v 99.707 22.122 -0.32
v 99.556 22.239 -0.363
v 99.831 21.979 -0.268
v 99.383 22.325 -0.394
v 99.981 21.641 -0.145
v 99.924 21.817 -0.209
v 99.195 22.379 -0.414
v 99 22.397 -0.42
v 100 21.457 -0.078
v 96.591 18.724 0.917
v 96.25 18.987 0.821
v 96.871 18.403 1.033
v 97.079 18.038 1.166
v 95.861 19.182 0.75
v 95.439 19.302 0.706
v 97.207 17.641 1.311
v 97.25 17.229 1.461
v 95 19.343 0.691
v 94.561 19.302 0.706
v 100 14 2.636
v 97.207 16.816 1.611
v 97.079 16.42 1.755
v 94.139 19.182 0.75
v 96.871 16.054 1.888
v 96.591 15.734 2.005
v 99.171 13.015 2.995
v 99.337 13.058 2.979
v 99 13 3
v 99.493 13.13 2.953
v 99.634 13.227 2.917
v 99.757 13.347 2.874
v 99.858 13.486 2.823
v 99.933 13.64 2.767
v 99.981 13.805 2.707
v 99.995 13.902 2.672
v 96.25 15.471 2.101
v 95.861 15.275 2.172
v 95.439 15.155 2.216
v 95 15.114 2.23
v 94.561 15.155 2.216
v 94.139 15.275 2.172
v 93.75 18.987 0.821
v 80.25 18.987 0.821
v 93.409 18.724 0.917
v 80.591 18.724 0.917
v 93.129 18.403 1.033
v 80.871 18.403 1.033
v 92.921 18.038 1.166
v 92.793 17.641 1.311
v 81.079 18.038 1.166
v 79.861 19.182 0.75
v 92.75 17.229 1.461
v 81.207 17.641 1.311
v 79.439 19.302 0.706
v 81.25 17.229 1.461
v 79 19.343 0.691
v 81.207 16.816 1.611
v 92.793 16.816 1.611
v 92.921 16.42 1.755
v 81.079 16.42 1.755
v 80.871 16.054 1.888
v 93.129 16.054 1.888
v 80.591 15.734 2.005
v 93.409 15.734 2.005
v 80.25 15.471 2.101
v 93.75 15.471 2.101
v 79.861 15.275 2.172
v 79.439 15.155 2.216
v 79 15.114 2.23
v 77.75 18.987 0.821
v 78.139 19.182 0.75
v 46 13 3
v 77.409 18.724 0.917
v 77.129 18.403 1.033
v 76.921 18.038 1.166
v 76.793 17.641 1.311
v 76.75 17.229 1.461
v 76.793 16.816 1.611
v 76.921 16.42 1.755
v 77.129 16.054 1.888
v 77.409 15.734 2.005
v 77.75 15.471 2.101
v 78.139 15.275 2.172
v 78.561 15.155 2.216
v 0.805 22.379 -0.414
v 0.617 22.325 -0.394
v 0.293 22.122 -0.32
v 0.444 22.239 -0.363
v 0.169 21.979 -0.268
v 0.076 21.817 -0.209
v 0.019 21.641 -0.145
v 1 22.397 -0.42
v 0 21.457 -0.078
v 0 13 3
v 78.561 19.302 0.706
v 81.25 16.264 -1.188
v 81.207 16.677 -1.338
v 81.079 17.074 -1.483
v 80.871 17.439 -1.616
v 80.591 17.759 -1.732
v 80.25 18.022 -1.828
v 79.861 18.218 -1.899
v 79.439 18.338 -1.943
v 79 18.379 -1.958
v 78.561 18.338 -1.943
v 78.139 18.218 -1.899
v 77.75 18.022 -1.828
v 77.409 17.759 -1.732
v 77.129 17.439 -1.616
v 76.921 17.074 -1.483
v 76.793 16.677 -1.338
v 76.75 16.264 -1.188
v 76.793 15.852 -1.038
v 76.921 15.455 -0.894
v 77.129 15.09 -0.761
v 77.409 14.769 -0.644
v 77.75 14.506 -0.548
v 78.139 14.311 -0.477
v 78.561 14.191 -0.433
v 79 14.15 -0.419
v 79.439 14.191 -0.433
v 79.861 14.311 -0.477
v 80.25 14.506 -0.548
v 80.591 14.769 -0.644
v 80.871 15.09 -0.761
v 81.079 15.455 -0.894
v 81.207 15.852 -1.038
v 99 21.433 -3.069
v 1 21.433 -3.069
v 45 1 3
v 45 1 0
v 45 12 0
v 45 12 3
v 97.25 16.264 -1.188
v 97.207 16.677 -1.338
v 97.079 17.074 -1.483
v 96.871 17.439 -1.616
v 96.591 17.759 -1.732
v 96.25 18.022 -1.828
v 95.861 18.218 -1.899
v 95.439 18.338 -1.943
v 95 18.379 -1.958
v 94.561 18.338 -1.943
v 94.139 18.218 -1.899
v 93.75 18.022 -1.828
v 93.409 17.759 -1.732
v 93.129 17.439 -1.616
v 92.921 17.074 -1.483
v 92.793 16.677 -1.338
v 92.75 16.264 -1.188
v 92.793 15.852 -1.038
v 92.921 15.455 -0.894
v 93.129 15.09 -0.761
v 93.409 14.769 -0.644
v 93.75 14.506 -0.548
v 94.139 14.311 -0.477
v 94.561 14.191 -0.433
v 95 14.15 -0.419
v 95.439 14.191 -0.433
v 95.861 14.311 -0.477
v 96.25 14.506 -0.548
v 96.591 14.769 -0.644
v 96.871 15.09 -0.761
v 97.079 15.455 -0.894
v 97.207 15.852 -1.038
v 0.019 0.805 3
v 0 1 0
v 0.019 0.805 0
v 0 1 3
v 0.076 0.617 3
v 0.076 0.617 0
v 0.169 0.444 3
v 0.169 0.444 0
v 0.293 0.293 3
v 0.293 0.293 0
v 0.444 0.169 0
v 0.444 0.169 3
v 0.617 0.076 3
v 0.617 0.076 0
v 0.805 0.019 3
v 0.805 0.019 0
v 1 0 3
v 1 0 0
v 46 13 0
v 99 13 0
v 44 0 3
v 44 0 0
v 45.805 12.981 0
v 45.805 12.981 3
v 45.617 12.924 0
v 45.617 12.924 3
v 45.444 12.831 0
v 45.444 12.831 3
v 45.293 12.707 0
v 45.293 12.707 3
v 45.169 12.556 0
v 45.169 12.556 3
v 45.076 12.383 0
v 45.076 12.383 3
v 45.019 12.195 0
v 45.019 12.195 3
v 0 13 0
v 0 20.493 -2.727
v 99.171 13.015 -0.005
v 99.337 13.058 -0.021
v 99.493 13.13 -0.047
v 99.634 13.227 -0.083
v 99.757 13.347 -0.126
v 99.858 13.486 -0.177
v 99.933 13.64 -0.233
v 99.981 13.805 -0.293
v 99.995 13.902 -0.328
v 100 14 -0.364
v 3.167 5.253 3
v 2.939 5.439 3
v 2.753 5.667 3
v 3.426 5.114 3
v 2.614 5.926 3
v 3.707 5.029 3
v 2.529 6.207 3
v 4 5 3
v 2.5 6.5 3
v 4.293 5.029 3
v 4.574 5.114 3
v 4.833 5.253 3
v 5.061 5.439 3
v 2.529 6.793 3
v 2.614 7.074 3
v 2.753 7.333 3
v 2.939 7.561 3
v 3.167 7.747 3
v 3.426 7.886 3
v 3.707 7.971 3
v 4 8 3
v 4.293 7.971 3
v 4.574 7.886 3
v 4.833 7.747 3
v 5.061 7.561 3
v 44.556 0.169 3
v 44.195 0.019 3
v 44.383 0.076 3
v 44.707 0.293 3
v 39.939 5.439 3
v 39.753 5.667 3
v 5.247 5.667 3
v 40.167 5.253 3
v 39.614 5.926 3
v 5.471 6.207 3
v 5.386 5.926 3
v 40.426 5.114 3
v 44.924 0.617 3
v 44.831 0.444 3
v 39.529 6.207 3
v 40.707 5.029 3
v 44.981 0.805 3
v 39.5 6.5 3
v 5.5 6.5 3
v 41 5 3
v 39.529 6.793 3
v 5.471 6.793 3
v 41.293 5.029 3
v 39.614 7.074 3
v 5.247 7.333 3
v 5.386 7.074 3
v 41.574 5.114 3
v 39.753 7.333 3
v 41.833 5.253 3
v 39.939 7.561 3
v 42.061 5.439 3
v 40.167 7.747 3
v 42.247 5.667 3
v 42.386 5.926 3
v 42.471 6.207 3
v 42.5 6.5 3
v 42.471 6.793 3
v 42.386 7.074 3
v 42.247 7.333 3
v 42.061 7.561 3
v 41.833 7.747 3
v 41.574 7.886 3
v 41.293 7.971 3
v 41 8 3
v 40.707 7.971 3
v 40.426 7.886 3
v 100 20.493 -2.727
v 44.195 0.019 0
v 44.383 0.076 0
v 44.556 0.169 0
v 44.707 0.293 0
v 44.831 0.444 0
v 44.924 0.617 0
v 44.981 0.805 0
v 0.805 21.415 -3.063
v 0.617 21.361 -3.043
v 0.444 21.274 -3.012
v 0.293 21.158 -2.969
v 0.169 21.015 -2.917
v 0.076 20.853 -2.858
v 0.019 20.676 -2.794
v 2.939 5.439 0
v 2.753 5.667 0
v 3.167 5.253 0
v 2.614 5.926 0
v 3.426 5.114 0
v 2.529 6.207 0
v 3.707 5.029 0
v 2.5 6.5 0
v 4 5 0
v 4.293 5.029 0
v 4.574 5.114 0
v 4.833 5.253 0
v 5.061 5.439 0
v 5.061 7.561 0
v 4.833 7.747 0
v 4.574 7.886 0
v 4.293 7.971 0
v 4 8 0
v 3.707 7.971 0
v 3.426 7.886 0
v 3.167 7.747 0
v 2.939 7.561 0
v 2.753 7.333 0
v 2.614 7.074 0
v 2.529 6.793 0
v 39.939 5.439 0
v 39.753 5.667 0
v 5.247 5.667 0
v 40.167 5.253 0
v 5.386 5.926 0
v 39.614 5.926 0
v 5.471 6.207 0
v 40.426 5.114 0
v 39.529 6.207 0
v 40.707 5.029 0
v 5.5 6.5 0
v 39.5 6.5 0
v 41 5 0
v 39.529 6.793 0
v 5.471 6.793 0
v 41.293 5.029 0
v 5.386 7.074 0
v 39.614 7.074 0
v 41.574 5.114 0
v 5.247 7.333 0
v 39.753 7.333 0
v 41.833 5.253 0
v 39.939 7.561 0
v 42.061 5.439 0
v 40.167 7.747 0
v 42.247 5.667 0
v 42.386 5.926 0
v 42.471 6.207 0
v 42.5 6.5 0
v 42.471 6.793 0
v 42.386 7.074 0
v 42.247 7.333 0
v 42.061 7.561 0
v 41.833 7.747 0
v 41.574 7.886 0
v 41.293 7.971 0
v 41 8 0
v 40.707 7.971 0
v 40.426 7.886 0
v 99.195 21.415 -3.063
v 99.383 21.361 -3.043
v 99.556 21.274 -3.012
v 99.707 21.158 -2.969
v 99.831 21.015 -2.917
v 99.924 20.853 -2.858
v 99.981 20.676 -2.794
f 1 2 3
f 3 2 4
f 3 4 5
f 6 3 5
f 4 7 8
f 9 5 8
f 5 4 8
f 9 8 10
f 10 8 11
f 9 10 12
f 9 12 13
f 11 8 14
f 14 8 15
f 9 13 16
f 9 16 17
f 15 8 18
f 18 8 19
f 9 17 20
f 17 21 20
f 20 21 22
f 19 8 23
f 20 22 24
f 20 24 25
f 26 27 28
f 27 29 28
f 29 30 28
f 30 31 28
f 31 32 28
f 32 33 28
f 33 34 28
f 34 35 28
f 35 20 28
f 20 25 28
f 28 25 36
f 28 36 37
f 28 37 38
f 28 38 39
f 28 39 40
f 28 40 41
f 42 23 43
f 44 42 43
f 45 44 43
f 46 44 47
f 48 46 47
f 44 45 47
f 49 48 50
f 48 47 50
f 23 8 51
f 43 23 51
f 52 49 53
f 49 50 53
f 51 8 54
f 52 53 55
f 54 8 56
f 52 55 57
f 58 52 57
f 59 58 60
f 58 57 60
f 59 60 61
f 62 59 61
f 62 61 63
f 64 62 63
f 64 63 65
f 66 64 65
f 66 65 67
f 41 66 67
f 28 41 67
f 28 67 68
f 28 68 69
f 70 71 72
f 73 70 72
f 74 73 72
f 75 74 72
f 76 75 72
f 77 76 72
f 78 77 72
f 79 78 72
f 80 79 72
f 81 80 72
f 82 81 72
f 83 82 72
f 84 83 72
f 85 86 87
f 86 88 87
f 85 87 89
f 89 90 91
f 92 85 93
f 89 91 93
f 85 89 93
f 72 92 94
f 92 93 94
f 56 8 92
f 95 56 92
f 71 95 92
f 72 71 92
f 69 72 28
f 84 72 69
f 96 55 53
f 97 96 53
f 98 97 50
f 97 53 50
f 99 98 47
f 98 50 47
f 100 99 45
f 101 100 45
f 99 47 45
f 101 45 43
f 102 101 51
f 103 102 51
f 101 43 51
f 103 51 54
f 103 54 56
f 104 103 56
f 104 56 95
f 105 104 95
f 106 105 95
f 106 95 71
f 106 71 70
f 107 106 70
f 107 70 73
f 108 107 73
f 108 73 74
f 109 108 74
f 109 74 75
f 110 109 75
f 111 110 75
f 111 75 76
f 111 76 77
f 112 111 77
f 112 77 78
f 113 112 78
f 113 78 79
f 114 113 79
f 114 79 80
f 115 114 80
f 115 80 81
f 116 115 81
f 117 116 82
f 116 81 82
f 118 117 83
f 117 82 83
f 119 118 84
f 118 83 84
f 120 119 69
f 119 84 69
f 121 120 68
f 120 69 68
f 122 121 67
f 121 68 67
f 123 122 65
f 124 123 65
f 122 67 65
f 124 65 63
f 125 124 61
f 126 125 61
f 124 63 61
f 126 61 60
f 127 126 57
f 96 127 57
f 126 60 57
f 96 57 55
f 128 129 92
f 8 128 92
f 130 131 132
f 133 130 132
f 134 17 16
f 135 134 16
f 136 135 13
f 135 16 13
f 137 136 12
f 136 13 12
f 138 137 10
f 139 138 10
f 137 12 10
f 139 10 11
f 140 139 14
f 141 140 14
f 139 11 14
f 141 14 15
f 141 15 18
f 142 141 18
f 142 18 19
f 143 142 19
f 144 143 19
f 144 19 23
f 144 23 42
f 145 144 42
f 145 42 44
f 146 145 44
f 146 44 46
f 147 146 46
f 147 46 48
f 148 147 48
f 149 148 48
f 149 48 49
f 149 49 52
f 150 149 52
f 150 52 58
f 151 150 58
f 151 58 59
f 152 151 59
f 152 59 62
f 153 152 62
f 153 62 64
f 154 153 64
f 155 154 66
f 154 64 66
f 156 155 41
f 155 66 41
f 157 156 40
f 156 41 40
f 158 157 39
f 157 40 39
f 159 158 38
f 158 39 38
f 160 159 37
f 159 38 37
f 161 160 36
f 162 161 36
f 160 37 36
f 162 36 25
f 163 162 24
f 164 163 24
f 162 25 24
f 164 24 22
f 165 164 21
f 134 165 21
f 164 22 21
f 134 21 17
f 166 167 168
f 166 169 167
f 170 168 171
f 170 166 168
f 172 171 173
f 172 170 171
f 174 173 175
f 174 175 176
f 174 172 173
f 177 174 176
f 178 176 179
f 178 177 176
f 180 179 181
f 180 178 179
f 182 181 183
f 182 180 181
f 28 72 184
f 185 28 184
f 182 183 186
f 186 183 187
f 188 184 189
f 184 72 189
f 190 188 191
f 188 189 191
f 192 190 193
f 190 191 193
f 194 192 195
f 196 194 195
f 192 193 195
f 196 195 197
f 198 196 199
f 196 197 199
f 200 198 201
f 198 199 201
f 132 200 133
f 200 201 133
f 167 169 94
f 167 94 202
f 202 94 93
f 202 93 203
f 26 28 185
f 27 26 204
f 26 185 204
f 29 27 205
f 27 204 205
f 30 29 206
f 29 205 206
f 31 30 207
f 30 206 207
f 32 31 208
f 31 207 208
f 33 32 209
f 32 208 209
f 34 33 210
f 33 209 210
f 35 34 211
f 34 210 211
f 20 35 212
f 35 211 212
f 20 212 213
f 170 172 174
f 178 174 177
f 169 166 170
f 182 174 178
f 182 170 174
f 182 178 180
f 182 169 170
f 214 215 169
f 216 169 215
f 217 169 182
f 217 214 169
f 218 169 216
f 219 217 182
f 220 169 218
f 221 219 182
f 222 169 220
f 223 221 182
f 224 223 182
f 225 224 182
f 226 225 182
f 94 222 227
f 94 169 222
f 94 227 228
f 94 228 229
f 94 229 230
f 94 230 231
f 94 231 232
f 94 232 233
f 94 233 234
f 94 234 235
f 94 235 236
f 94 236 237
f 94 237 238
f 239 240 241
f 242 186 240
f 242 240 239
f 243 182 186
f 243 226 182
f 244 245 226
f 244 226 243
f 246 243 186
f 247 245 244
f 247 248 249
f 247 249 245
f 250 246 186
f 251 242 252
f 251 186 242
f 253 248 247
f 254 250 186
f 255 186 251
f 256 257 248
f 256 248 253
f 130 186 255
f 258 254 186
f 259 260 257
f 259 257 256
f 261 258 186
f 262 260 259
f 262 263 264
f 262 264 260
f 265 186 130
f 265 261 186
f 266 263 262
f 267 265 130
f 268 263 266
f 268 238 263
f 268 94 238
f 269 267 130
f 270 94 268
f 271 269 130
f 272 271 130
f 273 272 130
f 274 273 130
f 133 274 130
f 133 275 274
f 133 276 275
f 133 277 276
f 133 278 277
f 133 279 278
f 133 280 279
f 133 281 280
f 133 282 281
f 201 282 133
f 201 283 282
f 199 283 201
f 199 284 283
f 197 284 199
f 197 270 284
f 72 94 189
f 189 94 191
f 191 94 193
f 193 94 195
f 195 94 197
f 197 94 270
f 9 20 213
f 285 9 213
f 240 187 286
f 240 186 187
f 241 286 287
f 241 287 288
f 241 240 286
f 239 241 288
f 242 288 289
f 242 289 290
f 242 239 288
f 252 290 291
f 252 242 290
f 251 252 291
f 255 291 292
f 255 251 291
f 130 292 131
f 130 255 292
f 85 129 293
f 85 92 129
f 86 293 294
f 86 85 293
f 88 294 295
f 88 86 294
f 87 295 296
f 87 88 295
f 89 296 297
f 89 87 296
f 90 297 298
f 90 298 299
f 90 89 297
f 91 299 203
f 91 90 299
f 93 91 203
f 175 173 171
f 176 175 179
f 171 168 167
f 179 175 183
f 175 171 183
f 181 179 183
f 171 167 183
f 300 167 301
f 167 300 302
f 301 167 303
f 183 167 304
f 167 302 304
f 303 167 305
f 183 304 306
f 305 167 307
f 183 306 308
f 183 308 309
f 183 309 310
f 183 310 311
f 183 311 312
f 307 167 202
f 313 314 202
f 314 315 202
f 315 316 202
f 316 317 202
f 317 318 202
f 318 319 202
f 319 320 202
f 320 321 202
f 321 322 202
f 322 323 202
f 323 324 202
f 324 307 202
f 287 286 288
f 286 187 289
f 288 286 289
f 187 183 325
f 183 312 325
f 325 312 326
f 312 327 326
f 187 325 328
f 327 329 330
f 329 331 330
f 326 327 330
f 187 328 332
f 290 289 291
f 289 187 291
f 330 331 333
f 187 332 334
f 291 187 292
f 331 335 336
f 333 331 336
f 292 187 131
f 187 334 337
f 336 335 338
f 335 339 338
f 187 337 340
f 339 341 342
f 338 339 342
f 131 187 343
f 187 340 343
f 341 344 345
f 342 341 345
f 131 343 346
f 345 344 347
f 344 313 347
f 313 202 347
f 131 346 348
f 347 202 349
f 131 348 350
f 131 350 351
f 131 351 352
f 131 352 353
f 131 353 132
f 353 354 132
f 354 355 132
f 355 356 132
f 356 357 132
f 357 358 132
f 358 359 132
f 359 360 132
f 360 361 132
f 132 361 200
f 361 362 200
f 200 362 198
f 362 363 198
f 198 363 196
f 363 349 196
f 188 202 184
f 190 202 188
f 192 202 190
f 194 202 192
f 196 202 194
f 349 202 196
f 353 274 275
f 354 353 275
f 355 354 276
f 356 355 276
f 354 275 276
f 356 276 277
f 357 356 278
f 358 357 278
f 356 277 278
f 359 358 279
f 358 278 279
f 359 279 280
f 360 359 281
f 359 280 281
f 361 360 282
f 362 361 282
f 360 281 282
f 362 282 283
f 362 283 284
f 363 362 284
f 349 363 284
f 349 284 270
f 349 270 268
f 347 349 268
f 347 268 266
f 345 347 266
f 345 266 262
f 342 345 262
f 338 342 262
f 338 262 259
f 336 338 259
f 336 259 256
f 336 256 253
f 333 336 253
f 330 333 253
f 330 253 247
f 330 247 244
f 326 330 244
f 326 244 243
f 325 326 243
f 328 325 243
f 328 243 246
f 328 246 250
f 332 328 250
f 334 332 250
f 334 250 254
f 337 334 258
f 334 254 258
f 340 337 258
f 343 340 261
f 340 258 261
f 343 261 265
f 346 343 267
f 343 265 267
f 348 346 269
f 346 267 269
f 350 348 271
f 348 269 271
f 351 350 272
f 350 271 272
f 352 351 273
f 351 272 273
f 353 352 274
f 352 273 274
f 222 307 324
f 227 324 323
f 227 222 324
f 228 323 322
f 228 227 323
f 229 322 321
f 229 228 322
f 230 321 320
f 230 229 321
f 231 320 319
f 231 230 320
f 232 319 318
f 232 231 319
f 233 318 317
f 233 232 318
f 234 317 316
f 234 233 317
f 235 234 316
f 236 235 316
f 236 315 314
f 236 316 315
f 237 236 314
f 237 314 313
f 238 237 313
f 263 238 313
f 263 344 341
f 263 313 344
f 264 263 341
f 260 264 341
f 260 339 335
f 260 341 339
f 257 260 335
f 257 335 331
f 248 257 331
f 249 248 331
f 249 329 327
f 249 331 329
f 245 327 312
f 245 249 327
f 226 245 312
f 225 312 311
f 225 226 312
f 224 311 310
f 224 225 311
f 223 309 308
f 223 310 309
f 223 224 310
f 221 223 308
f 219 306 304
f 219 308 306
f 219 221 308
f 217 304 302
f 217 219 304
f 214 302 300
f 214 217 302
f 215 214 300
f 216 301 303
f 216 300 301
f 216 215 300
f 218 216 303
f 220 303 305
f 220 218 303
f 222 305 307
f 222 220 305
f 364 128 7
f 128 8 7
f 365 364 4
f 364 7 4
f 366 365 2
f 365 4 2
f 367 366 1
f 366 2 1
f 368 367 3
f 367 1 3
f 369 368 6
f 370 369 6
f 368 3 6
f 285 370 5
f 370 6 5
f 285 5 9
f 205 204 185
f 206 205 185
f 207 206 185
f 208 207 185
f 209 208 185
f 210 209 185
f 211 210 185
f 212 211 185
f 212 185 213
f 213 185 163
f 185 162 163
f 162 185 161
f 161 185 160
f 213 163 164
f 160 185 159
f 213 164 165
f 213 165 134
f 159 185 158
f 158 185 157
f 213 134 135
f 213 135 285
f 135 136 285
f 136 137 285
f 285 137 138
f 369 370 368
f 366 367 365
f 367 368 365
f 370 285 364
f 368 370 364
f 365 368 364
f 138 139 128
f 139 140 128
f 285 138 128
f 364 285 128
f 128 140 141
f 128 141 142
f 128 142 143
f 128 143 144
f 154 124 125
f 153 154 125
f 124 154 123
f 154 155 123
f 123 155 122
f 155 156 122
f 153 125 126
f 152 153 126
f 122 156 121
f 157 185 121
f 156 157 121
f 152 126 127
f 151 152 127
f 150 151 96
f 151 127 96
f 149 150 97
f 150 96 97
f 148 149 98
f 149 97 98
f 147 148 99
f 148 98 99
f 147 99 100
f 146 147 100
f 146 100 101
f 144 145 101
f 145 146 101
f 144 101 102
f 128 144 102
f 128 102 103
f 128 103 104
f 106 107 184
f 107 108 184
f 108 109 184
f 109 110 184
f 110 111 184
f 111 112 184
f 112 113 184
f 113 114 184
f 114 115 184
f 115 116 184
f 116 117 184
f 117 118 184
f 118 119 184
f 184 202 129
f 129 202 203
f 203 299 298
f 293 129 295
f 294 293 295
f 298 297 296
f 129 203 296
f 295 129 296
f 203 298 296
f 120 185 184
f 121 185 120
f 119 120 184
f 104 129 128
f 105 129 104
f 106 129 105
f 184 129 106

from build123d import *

# Parameters (mm, degrees)
ESQUISSE1_W                = 45
ESQUISSE1_H                = 13
BOSS_EXTRU_1_DEPTH         = 3
ESQUISSE2_R                = 1.5
ENL_V_MAT_EXTRU_1_DEPTH    = 4
BOSS_EXTRU_3_DEPTH         = 100
CONG_1_R                   = 1
ESQUISSE12_R               = 2.25
ENL_V_MAT_EXTRU_3_DEPTH    = 11.149508308
R_P_TITION_LIN_AIRE1_COUNT = 2
R_P_TITION_LIN_AIRE1_PITCH = 16


with BuildPart() as part:
    # Esquisse1 → Boss.-Extru.1 (new body)
    with BuildSketch(Plane.XY):
        with Locations((22.5, 6.5)):
            Rectangle(ESQUISSE1_W, ESQUISSE1_H)
    extrude(amount=BOSS_EXTRU_1_DEPTH)

    # Esquisse2 → Enl_v. mat.-Extru.1 (cut, through all)
    with BuildSketch(Plane.XY.offset(3)):
        with Locations((41, 6.5)):
            Circle(ESQUISSE2_R)
    enl_v_mat_extru_1 = extrude(amount=-ENL_V_MAT_EXTRU_1_DEPTH, mode=Mode.SUBTRACT)

    # Sym_trie1: Enl_v. mat.-Extru.1 across plane
    add(enl_v_mat_extru_1.mirror(Plane.ZY.offset(-22.5)), mode=Mode.SUBTRACT)

    # Esquisse8 → Boss.-Extru.3 (add)
    with BuildSketch(Plane.ZY):
        Polygon((0, 13), (-3.069268098, 21.432744793), (-0.420201433, 22.396926208), (3, 13), align=None)
    extrude(amount=-BOSS_EXTRU_3_DEPTH)

    # Cong_1
    cong_1_edges = [part.edges().sort_by_distance(p)[0] for p in [
        (45, 0, 1.5),
        (0, 0, 1.5),
        (45, 13, 1.5),
        (100, 13, 1.5),
        (100, 21.914835501, -1.744734766),
        (0, 21.914835501, -1.744734766),
    ]]
    fillet(cong_1_edges, radius=CONG_1_R)

    # Esquisse12 → Enl_v. mat.-Extru.3 (cut, through all)
    with BuildSketch(Plane(origin=(0, 2.484892534, 6.827186128), x_dir=(1, 0, 0), z_dir=(0, 0.342020143, 0.939692621))):
        with Locations((95, 15.68994364)):
            Circle(ESQUISSE12_R)
    enl_v_mat_extru_3 = extrude(amount=-ENL_V_MAT_EXTRU_3_DEPTH, mode=Mode.SUBTRACT)

    # R_p_tition lin_aire1: Enl_v. mat.-Extru.3 ×2
    with Locations(*[(-i * R_P_TITION_LIN_AIRE1_PITCH, 0, 0) for i in range(1, R_P_TITION_LIN_AIRE1_COUNT)]):
        add(enl_v_mat_extru_3, mode=Mode.SUBTRACT)


solid = part.part
